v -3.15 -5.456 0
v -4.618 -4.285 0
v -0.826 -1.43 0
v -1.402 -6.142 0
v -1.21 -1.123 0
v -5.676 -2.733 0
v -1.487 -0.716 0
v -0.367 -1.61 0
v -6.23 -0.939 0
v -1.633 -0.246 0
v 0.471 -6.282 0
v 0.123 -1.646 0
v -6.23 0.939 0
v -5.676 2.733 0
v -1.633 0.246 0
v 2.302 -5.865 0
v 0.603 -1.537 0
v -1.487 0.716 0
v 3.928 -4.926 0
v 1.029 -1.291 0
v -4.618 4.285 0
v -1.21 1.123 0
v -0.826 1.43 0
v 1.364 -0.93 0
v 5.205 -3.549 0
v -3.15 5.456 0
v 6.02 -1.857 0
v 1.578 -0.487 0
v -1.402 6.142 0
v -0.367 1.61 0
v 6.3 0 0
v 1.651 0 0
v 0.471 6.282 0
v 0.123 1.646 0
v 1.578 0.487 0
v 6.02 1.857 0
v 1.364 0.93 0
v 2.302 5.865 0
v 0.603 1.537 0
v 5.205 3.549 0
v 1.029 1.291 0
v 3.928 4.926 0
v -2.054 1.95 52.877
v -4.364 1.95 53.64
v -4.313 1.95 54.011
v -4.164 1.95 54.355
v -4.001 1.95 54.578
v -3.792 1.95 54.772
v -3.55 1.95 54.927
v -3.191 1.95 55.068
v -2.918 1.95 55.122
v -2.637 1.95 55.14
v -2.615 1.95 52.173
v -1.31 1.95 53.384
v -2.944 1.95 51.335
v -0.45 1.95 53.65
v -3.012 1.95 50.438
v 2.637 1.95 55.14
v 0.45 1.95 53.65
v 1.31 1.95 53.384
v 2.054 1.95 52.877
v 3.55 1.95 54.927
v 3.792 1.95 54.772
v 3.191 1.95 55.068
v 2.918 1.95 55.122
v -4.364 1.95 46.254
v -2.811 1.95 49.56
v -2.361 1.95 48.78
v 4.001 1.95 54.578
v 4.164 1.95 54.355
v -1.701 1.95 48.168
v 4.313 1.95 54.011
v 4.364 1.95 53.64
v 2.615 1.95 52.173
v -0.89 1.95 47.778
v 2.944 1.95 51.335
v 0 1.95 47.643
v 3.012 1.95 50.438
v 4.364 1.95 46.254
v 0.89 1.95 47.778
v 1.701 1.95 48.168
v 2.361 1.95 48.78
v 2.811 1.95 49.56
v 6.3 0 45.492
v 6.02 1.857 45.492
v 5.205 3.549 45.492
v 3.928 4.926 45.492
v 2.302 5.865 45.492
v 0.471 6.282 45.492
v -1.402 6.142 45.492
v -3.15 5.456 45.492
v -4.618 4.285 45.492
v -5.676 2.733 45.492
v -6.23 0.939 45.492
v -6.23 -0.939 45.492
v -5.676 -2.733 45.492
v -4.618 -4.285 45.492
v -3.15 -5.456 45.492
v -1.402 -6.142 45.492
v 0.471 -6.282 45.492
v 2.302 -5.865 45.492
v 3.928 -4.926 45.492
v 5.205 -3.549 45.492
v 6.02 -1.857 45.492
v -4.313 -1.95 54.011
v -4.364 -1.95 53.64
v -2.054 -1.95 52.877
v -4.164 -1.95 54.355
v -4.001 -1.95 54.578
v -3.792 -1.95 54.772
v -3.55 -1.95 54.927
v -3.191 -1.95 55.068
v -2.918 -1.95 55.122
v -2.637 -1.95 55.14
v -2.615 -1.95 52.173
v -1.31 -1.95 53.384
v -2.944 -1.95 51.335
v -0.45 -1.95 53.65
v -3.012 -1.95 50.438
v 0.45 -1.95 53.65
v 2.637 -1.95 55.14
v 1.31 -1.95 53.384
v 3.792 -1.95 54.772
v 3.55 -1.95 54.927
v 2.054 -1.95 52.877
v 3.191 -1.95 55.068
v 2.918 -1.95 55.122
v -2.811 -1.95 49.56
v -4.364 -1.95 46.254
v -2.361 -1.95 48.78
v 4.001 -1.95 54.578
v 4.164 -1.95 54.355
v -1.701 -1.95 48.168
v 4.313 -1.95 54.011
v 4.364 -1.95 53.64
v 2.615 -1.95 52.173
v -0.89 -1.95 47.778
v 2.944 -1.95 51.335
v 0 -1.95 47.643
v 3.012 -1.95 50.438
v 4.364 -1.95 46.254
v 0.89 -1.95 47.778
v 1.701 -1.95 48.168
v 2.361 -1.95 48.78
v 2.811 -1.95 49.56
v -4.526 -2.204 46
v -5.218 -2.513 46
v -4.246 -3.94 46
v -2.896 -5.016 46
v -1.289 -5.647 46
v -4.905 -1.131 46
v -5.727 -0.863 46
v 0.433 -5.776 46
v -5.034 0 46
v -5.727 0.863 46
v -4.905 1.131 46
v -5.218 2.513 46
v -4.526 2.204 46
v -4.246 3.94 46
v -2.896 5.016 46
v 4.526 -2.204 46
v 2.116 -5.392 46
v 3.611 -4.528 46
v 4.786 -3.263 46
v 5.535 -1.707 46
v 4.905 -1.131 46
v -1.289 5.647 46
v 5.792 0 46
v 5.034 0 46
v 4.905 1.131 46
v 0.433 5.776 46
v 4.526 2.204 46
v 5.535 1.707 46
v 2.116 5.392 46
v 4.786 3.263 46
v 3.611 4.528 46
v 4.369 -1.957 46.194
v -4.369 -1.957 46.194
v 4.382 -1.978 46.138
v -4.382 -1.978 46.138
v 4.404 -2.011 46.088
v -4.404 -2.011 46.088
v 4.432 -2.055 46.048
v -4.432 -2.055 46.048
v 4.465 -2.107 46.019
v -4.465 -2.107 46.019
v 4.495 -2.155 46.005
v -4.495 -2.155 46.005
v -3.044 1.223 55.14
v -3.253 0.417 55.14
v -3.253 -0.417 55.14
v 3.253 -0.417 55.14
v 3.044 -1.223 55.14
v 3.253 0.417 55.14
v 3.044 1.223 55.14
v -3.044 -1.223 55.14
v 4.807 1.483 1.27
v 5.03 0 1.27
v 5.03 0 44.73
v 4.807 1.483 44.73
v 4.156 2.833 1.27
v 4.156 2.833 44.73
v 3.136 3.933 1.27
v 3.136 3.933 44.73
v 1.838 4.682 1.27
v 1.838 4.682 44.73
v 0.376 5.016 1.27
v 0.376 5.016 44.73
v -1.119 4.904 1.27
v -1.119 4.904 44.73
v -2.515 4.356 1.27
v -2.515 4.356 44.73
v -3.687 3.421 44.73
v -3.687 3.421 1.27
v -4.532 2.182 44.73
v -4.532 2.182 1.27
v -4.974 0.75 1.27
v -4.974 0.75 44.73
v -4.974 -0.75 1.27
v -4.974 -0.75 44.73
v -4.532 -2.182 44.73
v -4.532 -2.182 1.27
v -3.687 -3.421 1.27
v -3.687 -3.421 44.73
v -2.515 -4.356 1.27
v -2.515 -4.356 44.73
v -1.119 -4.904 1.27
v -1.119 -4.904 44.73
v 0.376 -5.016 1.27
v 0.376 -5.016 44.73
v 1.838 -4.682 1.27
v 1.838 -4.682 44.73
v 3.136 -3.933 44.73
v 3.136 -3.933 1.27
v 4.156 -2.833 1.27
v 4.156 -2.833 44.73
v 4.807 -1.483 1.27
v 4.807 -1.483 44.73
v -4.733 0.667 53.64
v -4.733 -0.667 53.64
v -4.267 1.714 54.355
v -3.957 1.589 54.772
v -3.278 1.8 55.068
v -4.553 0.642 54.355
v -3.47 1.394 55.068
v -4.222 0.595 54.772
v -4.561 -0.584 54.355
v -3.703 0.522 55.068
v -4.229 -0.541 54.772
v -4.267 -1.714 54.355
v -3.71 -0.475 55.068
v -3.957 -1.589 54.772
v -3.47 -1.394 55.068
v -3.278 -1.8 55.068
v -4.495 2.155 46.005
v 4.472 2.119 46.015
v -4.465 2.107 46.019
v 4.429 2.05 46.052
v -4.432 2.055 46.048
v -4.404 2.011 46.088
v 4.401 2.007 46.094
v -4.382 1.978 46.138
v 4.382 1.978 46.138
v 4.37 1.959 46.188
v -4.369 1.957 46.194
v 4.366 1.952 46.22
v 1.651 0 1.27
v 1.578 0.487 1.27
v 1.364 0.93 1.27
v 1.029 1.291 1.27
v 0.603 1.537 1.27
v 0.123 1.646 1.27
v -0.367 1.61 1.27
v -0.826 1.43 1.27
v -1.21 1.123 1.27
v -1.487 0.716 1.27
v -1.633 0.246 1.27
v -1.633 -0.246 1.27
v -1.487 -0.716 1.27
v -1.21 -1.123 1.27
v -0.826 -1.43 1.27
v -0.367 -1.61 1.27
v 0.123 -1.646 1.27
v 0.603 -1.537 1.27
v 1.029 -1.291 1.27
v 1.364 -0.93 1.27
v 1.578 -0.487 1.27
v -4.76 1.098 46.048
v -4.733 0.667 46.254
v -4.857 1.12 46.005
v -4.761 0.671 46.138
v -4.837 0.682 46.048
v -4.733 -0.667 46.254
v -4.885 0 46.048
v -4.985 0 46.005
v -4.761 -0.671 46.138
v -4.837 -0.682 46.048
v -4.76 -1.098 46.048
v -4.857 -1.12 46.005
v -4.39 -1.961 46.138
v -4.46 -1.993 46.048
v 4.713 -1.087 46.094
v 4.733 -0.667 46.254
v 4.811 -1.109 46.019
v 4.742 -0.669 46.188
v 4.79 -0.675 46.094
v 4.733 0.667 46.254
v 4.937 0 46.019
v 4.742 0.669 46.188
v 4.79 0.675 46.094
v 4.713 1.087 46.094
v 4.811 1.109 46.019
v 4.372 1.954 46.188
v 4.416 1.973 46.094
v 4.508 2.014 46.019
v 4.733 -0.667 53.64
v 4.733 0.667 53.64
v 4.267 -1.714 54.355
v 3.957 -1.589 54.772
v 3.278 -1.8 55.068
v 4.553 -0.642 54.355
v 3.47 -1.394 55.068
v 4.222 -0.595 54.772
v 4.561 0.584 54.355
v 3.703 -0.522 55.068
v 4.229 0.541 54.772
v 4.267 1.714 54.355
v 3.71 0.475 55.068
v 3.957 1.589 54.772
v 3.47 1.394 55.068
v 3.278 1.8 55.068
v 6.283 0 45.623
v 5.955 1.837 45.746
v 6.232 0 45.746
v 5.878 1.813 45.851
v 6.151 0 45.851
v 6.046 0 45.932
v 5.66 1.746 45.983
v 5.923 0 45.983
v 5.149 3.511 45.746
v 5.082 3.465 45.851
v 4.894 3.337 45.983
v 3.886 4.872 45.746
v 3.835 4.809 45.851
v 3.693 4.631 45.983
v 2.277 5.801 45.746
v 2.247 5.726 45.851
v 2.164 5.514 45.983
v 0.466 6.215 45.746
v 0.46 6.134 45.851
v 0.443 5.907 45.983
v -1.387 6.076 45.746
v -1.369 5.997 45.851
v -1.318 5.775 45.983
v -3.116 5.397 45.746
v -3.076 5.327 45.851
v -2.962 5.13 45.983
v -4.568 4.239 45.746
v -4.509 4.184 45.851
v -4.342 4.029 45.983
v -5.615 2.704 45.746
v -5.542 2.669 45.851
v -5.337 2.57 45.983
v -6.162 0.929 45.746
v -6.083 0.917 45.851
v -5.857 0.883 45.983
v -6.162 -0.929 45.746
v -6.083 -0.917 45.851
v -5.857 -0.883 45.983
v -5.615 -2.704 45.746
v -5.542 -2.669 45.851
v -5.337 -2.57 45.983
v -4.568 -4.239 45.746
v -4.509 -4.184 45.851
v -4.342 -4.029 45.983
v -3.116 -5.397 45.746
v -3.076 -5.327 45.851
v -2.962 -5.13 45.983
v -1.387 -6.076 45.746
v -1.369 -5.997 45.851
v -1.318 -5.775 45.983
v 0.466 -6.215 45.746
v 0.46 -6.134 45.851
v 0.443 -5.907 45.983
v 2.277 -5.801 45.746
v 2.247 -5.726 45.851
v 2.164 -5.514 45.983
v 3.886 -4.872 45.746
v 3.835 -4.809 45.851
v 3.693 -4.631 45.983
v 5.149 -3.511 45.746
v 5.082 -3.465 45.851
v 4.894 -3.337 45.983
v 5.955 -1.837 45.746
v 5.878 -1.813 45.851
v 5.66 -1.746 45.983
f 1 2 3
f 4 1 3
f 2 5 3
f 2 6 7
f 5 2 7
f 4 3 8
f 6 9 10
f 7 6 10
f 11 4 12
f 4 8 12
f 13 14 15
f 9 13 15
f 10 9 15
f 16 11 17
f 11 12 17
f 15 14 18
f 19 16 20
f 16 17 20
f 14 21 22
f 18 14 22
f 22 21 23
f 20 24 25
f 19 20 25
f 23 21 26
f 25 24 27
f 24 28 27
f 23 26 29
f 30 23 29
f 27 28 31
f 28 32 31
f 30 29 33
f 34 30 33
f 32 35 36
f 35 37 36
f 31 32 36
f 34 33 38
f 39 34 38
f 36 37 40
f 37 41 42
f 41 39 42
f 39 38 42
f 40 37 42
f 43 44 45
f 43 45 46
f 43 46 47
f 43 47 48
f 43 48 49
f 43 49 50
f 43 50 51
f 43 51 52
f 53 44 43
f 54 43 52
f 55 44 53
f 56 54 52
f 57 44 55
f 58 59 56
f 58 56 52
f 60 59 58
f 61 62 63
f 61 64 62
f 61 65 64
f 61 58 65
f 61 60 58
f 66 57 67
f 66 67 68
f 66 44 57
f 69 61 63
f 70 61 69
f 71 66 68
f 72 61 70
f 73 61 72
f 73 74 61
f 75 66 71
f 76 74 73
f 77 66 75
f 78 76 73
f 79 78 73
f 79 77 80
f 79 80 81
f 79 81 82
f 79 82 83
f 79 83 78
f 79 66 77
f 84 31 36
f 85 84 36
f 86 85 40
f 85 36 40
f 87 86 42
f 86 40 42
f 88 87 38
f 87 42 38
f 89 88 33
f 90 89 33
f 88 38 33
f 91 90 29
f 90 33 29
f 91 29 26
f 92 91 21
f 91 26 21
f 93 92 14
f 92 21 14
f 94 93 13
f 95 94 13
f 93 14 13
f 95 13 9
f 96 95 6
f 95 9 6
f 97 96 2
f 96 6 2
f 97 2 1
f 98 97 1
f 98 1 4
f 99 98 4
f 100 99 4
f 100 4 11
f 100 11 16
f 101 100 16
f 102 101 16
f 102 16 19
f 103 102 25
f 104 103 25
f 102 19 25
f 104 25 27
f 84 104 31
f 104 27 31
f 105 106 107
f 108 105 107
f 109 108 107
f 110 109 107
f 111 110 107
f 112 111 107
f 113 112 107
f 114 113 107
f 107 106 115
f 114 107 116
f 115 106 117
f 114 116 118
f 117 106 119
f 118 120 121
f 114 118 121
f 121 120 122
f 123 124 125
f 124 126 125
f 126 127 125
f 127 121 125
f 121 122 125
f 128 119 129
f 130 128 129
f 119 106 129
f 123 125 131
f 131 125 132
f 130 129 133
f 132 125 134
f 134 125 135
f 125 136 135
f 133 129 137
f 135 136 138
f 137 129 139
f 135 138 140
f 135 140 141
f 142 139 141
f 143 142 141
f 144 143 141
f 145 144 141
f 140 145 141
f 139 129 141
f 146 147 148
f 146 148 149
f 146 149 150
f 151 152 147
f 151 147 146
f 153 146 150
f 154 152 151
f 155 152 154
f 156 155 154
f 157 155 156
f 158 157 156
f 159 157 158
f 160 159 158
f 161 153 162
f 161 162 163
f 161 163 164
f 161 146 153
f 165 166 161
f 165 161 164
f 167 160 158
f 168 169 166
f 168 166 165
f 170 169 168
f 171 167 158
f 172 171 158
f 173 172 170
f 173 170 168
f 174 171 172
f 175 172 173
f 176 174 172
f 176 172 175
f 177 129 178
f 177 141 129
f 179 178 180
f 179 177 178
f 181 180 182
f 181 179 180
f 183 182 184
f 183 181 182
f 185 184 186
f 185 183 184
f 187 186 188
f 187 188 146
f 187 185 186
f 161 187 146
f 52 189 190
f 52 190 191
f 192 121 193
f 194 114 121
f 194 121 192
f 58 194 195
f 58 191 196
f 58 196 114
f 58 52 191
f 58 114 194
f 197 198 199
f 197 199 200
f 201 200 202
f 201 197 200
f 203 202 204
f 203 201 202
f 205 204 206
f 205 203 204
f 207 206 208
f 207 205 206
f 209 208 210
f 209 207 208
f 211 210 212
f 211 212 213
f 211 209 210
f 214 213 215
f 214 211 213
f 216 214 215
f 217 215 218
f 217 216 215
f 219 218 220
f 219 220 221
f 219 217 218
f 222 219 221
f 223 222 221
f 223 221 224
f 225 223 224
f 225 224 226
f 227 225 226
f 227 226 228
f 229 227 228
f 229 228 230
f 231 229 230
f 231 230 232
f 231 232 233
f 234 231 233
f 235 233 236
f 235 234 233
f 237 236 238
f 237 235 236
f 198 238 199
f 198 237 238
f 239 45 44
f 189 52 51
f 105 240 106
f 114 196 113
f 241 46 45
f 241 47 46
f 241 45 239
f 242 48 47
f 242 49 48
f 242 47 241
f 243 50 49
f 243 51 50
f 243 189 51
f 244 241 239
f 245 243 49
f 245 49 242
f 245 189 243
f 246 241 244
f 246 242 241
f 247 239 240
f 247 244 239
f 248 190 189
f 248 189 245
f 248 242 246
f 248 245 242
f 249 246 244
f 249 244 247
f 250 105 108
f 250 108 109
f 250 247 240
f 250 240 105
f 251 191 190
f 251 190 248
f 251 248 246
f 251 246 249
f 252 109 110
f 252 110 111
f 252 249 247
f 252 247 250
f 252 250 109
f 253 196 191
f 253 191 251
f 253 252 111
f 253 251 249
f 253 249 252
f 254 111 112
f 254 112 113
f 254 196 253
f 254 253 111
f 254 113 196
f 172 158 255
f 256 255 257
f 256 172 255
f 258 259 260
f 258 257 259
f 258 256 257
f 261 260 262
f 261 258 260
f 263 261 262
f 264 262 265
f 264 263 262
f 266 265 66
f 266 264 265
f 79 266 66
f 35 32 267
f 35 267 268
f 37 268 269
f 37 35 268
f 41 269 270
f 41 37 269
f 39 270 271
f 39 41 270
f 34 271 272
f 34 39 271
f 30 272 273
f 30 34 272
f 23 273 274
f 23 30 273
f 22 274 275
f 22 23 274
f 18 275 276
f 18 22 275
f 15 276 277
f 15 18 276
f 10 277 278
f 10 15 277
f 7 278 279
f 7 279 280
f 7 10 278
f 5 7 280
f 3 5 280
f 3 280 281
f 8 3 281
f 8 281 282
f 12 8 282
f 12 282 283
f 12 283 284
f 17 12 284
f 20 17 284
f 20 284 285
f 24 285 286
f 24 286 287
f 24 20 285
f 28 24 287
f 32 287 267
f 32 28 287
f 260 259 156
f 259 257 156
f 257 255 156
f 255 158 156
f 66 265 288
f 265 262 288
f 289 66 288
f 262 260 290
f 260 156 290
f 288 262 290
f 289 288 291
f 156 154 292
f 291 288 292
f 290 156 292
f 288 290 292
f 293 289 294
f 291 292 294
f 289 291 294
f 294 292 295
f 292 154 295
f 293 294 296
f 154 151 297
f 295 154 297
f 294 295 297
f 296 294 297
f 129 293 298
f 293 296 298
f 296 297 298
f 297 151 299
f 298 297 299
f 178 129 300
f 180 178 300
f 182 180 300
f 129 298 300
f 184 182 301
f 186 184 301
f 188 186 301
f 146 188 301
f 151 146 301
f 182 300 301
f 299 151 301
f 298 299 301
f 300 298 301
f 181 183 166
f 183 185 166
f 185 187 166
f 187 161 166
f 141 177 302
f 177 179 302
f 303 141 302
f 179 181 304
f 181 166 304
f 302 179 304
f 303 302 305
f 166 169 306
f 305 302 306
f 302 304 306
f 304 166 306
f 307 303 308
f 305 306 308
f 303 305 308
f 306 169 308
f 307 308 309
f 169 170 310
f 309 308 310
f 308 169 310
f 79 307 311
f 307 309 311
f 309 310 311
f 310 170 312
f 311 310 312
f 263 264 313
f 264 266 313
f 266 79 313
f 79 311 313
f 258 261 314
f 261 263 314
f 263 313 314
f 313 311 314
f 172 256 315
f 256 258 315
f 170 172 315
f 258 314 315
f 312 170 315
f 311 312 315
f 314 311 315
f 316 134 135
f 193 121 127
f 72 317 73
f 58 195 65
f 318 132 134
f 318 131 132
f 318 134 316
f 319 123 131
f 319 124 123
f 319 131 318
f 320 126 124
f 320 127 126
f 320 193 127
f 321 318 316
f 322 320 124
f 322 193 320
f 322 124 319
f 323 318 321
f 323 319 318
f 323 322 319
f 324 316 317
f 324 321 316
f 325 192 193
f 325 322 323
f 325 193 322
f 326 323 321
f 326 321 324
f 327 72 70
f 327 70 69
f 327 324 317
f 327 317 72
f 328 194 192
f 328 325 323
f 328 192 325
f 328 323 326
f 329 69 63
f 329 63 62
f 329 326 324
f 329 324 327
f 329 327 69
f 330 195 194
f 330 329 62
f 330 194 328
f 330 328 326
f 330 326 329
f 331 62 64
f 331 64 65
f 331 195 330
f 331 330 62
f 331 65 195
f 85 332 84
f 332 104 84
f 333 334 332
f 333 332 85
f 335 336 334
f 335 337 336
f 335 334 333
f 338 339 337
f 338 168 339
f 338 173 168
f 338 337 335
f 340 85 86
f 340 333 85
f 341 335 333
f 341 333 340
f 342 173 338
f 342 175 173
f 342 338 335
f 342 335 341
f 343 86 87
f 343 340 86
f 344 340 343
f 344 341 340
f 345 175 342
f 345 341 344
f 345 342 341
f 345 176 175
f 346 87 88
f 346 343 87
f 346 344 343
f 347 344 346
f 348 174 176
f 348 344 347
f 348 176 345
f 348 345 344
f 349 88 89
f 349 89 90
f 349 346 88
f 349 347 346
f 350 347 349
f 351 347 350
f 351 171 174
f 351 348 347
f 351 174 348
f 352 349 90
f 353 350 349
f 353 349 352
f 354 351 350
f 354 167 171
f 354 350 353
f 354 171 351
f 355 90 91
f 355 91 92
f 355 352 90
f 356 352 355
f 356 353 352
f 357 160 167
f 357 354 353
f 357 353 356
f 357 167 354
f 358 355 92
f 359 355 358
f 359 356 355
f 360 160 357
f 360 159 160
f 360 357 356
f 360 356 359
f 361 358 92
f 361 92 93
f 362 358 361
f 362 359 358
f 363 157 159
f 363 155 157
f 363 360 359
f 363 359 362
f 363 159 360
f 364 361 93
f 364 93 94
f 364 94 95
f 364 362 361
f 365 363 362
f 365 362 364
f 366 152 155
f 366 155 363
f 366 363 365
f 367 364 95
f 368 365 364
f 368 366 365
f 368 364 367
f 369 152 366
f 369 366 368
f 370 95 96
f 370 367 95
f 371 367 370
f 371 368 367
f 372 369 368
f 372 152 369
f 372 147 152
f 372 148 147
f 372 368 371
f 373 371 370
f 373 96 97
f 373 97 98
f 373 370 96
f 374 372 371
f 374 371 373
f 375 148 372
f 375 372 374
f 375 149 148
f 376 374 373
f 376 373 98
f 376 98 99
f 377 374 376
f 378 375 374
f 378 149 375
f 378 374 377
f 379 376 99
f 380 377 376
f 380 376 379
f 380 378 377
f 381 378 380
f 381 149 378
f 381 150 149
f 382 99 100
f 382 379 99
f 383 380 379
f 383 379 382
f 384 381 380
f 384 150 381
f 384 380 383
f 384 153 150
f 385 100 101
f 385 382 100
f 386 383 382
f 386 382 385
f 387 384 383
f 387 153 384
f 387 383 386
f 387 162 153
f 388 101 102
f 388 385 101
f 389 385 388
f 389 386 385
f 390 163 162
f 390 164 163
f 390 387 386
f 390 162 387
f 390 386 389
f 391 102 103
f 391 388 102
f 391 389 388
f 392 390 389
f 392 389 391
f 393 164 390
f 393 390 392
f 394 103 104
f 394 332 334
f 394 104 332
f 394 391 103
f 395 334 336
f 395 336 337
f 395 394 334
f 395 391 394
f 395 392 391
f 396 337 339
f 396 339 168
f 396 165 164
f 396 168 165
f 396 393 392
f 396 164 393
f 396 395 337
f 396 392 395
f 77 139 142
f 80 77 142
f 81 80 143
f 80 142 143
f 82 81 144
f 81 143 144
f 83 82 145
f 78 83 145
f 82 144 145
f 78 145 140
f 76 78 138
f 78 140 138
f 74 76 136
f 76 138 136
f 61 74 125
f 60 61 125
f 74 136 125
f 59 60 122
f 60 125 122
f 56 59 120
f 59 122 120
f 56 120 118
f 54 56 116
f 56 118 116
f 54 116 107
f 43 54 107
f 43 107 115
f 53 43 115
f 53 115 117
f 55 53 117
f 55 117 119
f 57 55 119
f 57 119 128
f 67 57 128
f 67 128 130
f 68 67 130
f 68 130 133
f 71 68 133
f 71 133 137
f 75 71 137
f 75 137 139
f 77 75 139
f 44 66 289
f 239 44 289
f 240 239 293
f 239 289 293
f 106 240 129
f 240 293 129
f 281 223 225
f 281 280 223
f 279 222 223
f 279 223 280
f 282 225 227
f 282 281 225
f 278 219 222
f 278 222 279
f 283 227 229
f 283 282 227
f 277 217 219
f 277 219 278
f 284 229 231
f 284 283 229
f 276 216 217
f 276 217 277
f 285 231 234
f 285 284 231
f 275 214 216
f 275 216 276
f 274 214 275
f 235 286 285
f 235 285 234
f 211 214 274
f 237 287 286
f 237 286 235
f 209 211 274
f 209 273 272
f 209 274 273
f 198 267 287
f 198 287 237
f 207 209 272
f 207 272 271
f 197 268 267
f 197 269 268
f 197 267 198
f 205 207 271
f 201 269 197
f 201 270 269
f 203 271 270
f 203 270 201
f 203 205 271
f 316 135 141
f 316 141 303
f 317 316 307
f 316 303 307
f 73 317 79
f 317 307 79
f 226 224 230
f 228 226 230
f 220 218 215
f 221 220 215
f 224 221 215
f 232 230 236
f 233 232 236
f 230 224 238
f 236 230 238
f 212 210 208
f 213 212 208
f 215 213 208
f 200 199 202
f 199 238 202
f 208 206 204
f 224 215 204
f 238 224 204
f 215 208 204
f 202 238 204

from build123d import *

# Parameters (mm, degrees)
SKETCH1_R           = 6.3
BASE_EXTRUDE_DEPTH  = 46
FILLET1_R           = 0.508
SHELL1_START        = 1.27
SHELL1_OUTLINE_R    = 5.03
SHELL1_DEPTH        = 43.46
SHELL1_2_OUTLINE_R  = 1.651
SHELL1_2_DEPTH      = 1.27
SKETCH3_R           = 4.78
BOSS_EXTRUDE1_DEPTH = 9.14
FILLET2_R           = 1.5
CUT_EXTRUDE1_START  = -9.14
CUT_EXTRUDE1_DEPTH  = 9.140003
FILLET6_R           = 0.254
SKETCH5_R           = 3.02
CUT_EXTRUDE2_DEPTH  = 57.108574321


# Read off the part's stored shape, not the designer's step: Shell1
with BuildPart() as part:
    # Sketch1 → Base-Extrude (new body)
    with BuildSketch(Plane.XY):
        Circle(SKETCH1_R)
    extrude(amount=BASE_EXTRUDE_DEPTH)

    # Fillet1
    fillet1_edges = [part.edges().sort_by_distance(p)[0] for p in [
        (-6.3, 0, 46),
    ]]
    fillet(fillet1_edges, radius=FILLET1_R)

    # Shell1 outline → Shell1 (cut)
    with BuildSketch(Plane.XY.offset(SHELL1_START)):
        Circle(SHELL1_OUTLINE_R)
    extrude(amount=SHELL1_DEPTH, mode=Mode.SUBTRACT)

    # Shell1 2 outline → Shell1 2 (cut)
    with BuildSketch(Plane.XY):
        Circle(SHELL1_2_OUTLINE_R)
    extrude(amount=SHELL1_2_DEPTH, mode=Mode.SUBTRACT)

    # Sketch3 → Boss-Extrude1 (add)
    with BuildSketch(Plane.XY.offset(46)):
        Circle(SKETCH3_R)
    extrude(amount=BOSS_EXTRUDE1_DEPTH)

    # Fillet2
    fillet2_edges = [part.edges().sort_by_distance(p)[0] for p in [
        (-4.78, 0, 55.14),
    ]]
    fillet(fillet2_edges, radius=FILLET2_R)

    # Sketch4 → Cut-Extrude1 (cut)
    with BuildSketch(Plane.XY.offset(55.14).offset(CUT_EXTRUDE1_START)):
        with BuildLine():
            Line((-4.364160859, 1.95), (4.364160859, 1.95))
            ThreePointArc((4.364160859, 1.95), (0, 4.78), (-4.364160859, 1.95))
        make_face()
        with BuildLine():
            Line((-4.364160859, -1.95), (4.364160859, -1.95))
            ThreePointArc((4.364160859, -1.95), (0, -4.78), (-4.364160859, -1.95))
        make_face()
    extrude(amount=CUT_EXTRUDE1_DEPTH, mode=Mode.SUBTRACT)

    # Fillet6
    fillet6_edges = [part.edges().sort_by_distance(p)[0] for p in [
        (-4.78, 0, 46),
        (0, 1.95, 46),
        (4.78, 0, 46),
        (0, -1.95, 46),
    ]]
    fillet(fillet6_edges, radius=FILLET6_R)

    # Sketch5 → Cut-Extrude2 (cut, through all)
    with BuildSketch(Plane.XZ.offset(1.95)):
        with Locations(Location((0, 50.663381062, 0), (0, 0, 270))):
            Circle(SKETCH5_R)
    extrude(amount=-CUT_EXTRUDE2_DEPTH, mode=Mode.SUBTRACT)


solid = part.part
